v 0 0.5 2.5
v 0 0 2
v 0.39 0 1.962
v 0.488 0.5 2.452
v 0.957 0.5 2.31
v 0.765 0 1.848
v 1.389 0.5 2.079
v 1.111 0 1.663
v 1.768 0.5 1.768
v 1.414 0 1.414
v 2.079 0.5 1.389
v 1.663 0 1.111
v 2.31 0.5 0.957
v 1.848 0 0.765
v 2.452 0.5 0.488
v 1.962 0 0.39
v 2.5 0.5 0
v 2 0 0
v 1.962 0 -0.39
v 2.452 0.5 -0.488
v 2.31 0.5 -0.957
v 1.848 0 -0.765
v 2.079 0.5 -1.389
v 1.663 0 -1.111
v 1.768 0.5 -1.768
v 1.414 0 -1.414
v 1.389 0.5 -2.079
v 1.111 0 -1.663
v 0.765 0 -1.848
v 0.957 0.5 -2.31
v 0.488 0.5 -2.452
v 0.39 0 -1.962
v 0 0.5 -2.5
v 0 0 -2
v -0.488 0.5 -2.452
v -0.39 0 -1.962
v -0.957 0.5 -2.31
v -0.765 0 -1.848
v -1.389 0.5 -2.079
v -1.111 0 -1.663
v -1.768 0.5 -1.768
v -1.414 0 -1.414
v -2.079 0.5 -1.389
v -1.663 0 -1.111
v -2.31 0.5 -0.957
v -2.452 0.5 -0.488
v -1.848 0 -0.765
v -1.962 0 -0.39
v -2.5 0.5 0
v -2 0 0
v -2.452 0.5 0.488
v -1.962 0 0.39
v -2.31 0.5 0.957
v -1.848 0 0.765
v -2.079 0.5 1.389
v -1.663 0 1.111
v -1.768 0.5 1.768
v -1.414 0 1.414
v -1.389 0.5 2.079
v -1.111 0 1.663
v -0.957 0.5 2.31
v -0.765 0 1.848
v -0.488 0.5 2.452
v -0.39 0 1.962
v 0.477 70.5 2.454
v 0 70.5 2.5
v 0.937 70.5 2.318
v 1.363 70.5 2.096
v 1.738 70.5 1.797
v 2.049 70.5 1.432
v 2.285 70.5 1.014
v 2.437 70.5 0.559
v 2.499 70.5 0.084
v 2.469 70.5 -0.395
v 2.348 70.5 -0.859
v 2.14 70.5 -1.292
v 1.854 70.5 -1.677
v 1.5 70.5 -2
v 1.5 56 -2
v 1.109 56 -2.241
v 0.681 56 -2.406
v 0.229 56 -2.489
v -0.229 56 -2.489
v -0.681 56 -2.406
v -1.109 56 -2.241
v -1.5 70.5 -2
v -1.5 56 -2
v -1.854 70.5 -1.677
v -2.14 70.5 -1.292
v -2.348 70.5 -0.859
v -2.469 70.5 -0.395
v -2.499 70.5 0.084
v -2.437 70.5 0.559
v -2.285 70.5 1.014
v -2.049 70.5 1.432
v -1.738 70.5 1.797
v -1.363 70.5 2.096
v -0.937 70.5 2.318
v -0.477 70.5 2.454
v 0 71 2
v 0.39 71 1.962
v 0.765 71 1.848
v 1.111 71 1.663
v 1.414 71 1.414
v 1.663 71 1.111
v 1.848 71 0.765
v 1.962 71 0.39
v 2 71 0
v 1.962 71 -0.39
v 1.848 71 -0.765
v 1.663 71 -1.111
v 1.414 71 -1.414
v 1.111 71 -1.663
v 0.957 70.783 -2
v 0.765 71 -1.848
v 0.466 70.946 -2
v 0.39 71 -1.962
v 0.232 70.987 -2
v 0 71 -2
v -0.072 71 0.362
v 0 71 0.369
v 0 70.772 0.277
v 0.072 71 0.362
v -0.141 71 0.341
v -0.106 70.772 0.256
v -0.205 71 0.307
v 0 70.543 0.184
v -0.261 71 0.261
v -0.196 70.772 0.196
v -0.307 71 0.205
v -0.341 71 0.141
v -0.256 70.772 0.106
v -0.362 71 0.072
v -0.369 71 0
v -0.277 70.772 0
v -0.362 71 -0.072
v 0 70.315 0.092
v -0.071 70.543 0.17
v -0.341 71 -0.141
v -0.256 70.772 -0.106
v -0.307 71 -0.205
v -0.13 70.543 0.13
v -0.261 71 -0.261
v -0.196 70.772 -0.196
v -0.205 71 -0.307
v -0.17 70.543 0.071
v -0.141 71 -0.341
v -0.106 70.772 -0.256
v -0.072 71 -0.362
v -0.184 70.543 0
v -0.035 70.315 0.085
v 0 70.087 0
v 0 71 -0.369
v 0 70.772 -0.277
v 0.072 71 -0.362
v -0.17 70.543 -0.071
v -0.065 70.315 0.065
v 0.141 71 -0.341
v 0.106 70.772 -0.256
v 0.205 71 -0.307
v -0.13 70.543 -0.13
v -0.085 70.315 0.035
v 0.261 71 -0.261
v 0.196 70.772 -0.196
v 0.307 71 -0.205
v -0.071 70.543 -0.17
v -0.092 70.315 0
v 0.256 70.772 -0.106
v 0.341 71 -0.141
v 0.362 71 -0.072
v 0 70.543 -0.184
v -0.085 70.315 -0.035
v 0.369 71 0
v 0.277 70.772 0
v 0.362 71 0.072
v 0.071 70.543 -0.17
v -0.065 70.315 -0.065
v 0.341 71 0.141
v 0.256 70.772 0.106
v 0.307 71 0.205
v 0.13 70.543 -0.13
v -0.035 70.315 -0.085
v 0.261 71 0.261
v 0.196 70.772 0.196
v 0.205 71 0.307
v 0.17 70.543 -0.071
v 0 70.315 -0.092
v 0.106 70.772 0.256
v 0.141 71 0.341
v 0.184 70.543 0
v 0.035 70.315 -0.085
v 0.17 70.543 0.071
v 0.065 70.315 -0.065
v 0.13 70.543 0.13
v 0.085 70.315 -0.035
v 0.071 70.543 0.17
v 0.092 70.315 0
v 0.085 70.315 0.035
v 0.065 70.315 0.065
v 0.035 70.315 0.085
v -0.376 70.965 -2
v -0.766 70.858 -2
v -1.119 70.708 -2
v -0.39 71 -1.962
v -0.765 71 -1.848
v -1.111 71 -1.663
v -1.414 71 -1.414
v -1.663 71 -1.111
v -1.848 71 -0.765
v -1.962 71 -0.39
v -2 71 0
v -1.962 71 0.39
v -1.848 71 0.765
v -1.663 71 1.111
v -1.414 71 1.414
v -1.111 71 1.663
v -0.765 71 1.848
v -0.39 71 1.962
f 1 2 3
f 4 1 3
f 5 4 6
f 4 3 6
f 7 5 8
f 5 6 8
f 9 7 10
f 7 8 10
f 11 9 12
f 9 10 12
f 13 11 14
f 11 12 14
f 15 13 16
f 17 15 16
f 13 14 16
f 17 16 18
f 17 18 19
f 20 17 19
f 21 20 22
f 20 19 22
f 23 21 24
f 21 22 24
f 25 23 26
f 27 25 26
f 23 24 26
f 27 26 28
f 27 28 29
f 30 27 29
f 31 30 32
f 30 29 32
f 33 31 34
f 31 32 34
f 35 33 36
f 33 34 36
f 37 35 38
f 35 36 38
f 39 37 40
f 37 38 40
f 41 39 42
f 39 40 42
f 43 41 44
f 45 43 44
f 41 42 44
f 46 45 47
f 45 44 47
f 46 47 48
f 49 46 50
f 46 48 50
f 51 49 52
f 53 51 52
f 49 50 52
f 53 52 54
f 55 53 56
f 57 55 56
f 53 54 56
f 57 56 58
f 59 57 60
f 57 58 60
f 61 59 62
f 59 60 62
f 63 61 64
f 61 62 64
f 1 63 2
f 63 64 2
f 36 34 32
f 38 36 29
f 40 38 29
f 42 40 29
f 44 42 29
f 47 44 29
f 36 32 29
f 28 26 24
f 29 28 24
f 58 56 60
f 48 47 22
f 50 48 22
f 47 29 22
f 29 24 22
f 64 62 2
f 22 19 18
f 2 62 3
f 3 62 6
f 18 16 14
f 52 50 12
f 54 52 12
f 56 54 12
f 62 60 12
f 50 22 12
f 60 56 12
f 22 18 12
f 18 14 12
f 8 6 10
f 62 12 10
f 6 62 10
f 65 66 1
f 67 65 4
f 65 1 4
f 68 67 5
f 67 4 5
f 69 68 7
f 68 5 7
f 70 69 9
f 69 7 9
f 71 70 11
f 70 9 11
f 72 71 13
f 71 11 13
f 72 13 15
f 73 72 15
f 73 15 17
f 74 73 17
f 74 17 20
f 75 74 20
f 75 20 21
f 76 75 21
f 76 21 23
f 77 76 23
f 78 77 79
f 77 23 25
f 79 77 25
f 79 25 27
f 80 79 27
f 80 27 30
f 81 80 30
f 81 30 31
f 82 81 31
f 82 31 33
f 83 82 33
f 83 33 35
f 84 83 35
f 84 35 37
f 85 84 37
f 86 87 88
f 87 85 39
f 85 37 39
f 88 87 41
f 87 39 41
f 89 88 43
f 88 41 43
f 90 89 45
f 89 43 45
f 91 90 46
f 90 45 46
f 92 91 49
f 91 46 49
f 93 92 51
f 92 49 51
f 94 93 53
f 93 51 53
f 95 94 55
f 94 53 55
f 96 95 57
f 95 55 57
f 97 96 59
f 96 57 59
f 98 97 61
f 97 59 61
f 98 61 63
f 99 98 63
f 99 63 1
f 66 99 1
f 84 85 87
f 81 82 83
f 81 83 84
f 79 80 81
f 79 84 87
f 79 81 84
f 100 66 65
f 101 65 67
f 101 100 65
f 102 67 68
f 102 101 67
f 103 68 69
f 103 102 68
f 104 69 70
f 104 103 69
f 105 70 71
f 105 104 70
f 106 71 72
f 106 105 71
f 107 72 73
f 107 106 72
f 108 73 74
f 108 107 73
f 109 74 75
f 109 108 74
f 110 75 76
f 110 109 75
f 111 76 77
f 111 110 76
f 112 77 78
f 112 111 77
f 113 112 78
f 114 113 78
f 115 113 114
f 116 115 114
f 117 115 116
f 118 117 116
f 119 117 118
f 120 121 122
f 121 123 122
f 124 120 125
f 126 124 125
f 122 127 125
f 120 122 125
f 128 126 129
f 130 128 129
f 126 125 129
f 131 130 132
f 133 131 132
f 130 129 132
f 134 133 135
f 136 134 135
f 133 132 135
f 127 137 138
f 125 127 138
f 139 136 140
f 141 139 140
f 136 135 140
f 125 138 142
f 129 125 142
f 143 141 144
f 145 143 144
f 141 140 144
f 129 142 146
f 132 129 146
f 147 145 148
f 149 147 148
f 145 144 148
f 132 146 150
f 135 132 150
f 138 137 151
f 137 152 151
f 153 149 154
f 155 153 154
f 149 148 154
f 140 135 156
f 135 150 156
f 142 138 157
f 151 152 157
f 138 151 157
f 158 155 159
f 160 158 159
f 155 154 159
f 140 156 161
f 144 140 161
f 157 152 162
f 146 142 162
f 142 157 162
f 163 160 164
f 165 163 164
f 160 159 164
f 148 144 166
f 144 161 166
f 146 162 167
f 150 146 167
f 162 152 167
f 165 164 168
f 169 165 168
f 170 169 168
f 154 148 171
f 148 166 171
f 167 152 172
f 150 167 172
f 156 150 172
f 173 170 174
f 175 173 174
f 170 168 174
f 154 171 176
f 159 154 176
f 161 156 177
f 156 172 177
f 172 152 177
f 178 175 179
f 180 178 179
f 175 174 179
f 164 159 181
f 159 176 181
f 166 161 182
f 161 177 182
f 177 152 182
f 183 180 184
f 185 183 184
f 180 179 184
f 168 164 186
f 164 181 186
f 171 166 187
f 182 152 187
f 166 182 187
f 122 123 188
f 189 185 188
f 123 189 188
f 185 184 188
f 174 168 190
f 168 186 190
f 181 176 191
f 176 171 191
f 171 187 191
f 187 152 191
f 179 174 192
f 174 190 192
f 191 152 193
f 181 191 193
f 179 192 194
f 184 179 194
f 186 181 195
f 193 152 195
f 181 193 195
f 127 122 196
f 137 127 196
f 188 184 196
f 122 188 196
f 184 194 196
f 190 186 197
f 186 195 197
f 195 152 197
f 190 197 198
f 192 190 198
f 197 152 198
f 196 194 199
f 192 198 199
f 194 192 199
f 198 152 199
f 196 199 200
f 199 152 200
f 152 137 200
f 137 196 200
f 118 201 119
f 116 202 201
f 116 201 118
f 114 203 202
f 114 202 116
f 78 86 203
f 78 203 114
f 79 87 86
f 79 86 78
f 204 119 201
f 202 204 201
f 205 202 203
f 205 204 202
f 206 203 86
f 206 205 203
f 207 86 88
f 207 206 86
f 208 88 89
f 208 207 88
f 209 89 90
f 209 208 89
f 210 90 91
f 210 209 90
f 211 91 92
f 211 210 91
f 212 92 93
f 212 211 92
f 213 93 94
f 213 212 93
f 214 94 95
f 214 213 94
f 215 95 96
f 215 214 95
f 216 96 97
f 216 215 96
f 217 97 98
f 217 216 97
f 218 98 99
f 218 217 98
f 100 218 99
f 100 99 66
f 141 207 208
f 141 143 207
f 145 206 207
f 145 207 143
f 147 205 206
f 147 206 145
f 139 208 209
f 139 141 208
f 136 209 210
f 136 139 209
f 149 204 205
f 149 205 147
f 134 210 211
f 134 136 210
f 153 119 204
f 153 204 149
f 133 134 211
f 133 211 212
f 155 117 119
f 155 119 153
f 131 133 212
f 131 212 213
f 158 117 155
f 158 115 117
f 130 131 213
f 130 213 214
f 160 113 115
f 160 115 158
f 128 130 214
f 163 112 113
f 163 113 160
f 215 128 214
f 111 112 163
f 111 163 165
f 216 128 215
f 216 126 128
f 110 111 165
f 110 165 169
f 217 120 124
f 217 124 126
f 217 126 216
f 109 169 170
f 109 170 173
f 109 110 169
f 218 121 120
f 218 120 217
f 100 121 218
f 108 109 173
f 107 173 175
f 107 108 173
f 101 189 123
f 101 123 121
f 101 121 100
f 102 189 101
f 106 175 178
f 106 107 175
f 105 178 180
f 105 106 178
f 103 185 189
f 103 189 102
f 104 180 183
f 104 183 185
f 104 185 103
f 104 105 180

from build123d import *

# Parameters (mm, degrees)
SKETCH_1_R          = 2.5
EXTRUDE_1_DEPTH     = 71
CHAMFER_1_SIZE      = 0.5
CUT_EXTRUDE_START   = -15
CUT_EXTRUDE_2_DEPTH = 15


with BuildPart() as part:
    # Эскиз1 → Бобышка-Вытянуть1 (new body)
    with BuildSketch(Plane(origin=(0, 0, 0), x_dir=(1, 0, 0), z_dir=(0, 1, 0))):
        with Locations(Location((0, 0, 0), (0, 0, 270))):
            Circle(SKETCH_1_R)
    extrude(amount=EXTRUDE_1_DEPTH)

    # Фаска1
    chamfer_1_edges = [part.edges().sort_by_distance(p)[0] for p in [
        (0, 0, -2.5),
        (0, 71, -2.5),
    ]]
    chamfer(chamfer_1_edges, length=CHAMFER_1_SIZE)

    # Вырез-Вытянуть1 cone 1 section (through the dimple's axis) → Вырез-Вытянуть1 (revolve, cut)
    with BuildSketch(Plane(origin=(0, 71, 0), x_dir=(0, 0, 1), z_dir=(1, 0, 0))):
        Polygon((0, 0), (0.368933835, 0), (0, 0.913143285), align=None)
    revolve(axis=Axis((0, 71, 0), (0, -1, 0)), mode=Mode.SUBTRACT)

    # Эскиз3 → Вырез-Вытянуть2 (cut)
    with BuildSketch(Plane(origin=(0, 71, 0), x_dir=(1, 0, 0), z_dir=(0, 1, 0)).offset(CUT_EXTRUDE_START)):
        with BuildLine():
            Line((-1.5, 2), (1.5, 2))
            ThreePointArc((1.5, 2), (0, 2.5), (-1.5, 2))
        make_face()
    extrude(amount=CUT_EXTRUDE_2_DEPTH, mode=Mode.SUBTRACT)


solid = part.part
